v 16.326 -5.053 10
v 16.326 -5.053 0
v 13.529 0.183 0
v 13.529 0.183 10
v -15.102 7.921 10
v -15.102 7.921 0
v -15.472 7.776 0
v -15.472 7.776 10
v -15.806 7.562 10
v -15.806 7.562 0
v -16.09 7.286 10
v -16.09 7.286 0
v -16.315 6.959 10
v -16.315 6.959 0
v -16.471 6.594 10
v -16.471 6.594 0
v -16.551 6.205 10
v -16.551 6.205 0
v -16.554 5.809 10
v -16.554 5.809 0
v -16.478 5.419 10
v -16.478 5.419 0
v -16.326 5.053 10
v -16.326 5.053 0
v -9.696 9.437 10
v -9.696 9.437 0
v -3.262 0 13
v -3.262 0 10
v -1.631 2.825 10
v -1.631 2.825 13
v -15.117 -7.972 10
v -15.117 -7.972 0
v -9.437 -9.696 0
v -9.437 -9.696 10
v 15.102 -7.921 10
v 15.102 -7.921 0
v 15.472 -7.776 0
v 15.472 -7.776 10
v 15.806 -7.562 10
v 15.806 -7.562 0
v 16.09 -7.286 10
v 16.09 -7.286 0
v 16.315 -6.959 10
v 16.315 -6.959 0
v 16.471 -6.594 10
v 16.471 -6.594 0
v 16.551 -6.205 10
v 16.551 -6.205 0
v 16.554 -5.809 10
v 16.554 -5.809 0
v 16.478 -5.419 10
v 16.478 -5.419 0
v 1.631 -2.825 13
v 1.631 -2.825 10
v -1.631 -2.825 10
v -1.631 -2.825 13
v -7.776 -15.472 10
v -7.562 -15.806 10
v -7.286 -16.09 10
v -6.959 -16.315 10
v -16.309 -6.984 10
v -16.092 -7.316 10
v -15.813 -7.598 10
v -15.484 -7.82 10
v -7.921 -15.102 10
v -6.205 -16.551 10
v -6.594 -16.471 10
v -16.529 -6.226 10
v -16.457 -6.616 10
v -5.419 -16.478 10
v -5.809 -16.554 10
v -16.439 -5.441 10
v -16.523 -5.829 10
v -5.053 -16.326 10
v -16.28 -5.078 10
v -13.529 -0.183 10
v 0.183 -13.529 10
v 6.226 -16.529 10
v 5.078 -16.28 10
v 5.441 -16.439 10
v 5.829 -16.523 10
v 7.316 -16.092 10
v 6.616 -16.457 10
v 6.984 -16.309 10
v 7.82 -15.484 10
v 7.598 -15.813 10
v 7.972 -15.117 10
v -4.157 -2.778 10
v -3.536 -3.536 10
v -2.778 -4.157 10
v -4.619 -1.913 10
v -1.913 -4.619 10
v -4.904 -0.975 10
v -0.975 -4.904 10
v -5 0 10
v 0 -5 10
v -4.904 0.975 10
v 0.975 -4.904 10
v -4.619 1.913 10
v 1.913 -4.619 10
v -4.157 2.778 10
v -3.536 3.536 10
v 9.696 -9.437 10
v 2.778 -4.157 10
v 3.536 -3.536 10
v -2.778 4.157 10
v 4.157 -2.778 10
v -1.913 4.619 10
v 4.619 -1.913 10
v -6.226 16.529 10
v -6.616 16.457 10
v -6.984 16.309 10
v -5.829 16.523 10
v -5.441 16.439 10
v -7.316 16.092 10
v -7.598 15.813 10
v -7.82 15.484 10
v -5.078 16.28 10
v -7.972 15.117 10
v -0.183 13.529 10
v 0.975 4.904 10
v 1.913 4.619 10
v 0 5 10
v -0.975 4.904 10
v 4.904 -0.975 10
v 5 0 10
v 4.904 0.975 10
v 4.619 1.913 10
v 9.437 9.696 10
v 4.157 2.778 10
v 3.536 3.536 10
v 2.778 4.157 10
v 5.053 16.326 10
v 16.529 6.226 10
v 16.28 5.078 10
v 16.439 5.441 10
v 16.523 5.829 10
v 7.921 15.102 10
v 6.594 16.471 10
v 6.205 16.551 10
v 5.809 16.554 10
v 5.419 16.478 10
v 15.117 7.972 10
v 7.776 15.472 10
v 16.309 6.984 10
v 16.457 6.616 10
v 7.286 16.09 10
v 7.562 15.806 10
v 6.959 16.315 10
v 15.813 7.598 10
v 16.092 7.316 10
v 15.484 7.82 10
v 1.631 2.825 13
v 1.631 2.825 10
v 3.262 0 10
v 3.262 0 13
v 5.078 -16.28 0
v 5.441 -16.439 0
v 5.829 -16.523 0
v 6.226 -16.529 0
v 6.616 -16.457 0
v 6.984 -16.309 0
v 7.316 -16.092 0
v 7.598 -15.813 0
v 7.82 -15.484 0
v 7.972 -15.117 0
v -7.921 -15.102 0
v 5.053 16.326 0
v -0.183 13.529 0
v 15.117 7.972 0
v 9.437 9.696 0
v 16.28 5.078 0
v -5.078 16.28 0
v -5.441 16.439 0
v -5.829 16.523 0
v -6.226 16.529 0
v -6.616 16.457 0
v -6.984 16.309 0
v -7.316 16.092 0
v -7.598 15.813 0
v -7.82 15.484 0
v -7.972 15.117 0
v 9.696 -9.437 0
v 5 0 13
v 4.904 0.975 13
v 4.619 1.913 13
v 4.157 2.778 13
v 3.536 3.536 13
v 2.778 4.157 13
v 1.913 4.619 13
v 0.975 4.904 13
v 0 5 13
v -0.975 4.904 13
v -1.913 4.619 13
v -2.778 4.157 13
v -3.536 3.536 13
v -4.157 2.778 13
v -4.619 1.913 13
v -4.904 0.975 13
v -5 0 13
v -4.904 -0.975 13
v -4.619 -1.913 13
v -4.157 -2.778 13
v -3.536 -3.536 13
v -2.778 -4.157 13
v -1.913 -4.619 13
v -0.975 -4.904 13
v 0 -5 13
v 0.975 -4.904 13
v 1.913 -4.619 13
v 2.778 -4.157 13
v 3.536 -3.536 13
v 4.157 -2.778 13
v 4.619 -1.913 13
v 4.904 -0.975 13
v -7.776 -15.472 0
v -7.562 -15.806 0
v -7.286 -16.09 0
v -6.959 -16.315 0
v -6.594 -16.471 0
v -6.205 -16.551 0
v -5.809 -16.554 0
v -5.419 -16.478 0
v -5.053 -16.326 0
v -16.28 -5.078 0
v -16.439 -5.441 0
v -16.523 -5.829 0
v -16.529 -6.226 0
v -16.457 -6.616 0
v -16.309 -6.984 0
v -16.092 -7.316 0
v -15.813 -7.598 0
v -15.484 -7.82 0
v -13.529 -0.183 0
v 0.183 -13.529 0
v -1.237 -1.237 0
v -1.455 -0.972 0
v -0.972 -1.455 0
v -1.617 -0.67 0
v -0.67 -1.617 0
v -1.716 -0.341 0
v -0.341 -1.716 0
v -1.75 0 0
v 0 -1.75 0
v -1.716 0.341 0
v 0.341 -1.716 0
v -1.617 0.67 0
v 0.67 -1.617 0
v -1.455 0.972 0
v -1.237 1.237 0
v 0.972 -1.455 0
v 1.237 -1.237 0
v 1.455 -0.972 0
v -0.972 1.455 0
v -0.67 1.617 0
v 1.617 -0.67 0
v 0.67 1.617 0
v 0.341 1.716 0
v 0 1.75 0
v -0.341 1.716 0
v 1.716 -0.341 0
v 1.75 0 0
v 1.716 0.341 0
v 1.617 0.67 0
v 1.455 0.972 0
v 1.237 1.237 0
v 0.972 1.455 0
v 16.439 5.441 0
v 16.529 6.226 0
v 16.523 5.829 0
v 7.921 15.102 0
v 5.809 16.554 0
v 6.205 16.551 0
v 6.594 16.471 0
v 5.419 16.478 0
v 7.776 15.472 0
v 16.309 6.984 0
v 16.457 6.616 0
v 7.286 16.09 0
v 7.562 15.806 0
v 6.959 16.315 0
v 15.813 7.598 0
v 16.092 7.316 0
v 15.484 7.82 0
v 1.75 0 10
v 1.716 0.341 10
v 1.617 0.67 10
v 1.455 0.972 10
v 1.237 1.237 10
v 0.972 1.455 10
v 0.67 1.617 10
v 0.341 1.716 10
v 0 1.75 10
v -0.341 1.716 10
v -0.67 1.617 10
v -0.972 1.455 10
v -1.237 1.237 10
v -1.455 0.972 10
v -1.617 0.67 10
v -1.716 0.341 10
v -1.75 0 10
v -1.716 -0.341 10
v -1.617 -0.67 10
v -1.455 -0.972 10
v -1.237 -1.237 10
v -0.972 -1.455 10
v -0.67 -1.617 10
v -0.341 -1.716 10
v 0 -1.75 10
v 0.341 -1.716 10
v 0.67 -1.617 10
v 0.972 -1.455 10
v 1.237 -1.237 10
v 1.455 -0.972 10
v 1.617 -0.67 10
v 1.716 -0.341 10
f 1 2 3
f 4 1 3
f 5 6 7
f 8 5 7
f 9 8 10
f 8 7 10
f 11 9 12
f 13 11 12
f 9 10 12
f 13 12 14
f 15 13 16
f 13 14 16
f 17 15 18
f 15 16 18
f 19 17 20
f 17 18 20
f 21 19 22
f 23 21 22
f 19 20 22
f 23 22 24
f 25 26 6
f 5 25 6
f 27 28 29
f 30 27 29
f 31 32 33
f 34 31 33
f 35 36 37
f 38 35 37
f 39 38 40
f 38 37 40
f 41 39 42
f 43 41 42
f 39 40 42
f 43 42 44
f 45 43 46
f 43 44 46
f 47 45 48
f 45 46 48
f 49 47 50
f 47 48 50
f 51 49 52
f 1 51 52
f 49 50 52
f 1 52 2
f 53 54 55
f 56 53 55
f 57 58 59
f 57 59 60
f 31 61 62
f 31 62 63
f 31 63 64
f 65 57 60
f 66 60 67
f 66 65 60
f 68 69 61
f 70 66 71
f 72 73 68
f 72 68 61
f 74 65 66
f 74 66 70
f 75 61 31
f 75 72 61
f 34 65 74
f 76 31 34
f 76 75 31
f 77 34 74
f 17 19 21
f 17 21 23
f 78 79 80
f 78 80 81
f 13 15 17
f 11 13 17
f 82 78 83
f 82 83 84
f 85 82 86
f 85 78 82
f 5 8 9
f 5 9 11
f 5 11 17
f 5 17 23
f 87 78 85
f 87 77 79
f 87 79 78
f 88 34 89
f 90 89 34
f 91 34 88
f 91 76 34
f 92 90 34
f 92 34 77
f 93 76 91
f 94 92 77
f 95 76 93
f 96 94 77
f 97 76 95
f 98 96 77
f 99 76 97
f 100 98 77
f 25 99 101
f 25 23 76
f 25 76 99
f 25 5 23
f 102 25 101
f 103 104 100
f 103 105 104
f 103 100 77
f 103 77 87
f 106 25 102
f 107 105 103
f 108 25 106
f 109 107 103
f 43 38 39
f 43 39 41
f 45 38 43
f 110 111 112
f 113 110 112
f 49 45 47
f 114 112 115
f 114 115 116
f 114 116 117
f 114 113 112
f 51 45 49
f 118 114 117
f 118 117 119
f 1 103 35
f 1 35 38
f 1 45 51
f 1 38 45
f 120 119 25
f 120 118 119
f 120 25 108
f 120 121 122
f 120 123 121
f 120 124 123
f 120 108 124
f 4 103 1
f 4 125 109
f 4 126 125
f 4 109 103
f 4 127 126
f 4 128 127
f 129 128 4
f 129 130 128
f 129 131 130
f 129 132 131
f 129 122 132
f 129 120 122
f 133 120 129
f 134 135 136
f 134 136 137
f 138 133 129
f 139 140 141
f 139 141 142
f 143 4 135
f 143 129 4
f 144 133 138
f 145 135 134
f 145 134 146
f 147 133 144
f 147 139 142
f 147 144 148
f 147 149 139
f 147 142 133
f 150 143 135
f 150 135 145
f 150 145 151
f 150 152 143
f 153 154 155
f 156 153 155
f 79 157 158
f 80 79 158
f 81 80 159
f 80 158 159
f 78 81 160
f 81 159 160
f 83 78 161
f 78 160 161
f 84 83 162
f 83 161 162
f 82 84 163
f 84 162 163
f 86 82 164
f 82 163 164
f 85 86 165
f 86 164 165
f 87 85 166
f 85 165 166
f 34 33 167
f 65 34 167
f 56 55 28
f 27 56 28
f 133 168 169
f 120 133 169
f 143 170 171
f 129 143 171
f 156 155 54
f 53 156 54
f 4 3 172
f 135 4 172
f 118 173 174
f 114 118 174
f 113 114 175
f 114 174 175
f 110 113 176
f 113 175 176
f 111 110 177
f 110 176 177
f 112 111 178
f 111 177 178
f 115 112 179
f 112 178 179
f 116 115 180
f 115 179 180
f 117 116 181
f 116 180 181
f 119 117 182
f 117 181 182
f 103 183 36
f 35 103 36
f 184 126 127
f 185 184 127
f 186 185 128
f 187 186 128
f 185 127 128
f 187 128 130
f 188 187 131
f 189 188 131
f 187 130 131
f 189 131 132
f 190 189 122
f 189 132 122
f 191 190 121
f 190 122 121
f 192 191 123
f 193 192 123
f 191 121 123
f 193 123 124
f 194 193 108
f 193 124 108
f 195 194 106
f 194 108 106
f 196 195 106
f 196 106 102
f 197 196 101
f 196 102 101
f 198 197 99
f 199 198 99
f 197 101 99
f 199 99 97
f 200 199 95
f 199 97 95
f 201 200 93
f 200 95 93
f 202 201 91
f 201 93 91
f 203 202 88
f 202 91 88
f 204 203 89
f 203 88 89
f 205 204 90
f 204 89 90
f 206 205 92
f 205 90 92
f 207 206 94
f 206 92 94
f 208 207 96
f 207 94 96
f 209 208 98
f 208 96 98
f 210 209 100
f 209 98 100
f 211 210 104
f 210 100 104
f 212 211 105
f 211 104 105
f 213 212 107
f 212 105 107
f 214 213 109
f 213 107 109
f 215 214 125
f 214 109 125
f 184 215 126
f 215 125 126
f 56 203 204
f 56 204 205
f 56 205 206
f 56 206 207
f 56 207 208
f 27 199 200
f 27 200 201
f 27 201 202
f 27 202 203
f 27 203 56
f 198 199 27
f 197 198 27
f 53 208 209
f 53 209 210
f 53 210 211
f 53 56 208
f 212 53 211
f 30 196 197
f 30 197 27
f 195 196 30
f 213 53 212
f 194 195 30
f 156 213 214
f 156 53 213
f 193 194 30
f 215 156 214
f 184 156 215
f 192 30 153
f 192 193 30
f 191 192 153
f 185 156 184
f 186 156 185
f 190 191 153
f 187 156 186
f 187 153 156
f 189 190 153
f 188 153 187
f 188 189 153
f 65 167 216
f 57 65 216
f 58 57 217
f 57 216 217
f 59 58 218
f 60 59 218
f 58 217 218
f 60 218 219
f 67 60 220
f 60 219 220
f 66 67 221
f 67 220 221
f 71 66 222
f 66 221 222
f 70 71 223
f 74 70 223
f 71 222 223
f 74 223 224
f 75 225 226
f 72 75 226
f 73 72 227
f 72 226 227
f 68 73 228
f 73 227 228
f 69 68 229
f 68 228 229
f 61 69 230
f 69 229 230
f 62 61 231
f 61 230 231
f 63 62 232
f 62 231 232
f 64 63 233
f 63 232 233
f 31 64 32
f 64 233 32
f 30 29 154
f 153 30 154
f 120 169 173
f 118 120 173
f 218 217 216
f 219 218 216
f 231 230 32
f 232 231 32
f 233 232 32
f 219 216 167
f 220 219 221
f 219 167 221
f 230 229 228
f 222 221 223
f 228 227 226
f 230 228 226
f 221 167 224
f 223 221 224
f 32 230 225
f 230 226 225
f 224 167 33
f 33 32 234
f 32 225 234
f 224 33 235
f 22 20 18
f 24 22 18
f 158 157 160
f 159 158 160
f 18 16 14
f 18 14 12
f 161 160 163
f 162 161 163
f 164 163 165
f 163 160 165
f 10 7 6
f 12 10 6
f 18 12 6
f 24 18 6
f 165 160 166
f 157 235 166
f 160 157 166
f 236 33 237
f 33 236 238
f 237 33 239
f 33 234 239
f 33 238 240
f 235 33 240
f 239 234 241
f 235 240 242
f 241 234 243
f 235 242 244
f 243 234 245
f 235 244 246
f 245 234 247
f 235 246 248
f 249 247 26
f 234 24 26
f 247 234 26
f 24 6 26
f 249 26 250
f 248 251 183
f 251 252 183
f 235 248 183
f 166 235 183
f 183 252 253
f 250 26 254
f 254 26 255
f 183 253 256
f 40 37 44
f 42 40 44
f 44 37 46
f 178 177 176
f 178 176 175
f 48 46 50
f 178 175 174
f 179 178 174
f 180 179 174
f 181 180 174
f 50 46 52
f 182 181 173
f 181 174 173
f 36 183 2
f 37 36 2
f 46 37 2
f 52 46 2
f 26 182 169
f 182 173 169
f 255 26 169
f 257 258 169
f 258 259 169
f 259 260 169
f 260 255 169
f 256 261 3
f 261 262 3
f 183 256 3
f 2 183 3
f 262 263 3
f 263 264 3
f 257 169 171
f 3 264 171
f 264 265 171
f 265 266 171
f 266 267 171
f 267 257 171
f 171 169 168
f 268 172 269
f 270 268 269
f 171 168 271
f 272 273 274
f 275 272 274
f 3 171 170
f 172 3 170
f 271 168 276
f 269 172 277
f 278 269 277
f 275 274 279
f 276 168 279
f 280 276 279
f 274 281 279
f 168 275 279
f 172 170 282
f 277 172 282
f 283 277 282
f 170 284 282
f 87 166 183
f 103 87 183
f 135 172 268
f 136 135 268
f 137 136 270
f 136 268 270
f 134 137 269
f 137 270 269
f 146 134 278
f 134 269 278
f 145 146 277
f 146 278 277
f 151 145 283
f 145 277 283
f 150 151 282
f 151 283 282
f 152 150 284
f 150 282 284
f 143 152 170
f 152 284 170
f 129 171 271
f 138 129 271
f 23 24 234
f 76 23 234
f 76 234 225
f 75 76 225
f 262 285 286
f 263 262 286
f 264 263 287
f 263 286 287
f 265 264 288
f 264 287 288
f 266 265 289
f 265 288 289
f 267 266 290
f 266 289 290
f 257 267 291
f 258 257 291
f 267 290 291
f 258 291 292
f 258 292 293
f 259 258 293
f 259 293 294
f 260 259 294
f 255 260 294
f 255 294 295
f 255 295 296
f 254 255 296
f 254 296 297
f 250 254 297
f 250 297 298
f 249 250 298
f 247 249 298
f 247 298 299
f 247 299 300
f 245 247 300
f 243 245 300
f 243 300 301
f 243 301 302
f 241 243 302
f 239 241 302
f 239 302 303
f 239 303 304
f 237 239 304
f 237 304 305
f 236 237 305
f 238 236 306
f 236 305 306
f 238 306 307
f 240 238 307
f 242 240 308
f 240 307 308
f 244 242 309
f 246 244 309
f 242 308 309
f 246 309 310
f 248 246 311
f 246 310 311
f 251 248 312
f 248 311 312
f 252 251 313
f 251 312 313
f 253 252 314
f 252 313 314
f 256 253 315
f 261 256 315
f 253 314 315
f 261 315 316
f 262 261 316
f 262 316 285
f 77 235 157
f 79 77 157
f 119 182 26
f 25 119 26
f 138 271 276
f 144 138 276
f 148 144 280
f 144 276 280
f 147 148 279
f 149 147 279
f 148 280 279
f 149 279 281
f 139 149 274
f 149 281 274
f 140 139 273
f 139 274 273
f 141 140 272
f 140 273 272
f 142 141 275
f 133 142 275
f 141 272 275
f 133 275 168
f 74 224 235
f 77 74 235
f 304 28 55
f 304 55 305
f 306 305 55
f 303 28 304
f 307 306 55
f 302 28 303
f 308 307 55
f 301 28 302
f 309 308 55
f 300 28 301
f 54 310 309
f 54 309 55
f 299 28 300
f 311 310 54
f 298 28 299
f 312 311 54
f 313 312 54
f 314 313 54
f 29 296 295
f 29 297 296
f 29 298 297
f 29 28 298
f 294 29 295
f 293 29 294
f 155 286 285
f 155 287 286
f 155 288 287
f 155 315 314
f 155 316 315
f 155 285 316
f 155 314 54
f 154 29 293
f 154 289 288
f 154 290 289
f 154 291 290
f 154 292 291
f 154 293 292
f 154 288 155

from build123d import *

# Parameters (mm, degrees)
F1_DEPTH = 10
F2_R     = 5
F3_DEPTH = 3
F4_R     = 1.75
F5_DEPTH = 10.001


with BuildPart() as f1:
    # F0 (on Top) → F1 (new body)
    with BuildSketch(Plane.XY):
        with BuildLine():
            Line((-7.971794, 15.117246), (-9.695514, 9.43691))
            Line((-9.695514, 9.43691), (-15.102408, 7.920959))
            ThreePointArc((-15.102408, 7.920959), (-16.401997, 6.78019), (-16.326416, 5.052598))
            Line((-16.326416, 5.052598), (-13.528667, -0.182861))
            Line((-13.528667, -0.182861), (-16.279979, -5.078052))
            ThreePointArc((-16.279979, -5.078052), (-16.392282, -6.803645), (-15.117246, -7.971794))
            Line((-15.117246, -7.971794), (-9.43691, -9.695514))
            Line((-9.43691, -9.695514), (-7.920959, -15.102408))
            ThreePointArc((-7.920959, -15.102408), (-6.78019, -16.401997), (-5.052598, -16.326416))
            Line((-5.052598, -16.326416), (0.182861, -13.528667))
            Line((0.182861, -13.528667), (5.078052, -16.279979))
            ThreePointArc((5.078052, -16.279979), (6.803645, -16.392282), (7.971794, -15.117246))
            Line((7.971794, -15.117246), (9.695514, -9.43691))
            Line((9.695514, -9.43691), (15.102408, -7.920959))
            ThreePointArc((15.102408, -7.920959), (16.401997, -6.78019), (16.326416, -5.052598))
            Line((16.326416, -5.052598), (13.528667, 0.182861))
            Line((13.528667, 0.182861), (16.279979, 5.078052))
            ThreePointArc((16.279979, 5.078052), (16.392282, 6.803645), (15.117246, 7.971794))
            Line((15.117246, 7.971794), (9.43691, 9.695514))
            Line((9.43691, 9.695514), (7.920959, 15.102408))
            ThreePointArc((7.920959, 15.102408), (6.78019, 16.401997), (5.052598, 16.326416))
            Line((5.052598, 16.326416), (-0.182861, 13.528667))
            Line((-0.182861, 13.528667), (-5.078052, 16.279979))
            ThreePointArc((-5.078052, 16.279979), (-6.803645, 16.392282), (-7.971794, 15.117246))
        make_face()
    extrude(amount=F1_DEPTH)

    # F2 (on face) → F3 (join)
    with BuildSketch(Plane.XY.offset(10)):
        Circle(F2_R)
        Polygon((-3.262029, 0), (-1.631015, 2.825), (1.631015, 2.825), (3.262029, 0), (1.631015, -2.825), (-1.631015, -2.825), align=None, mode=Mode.SUBTRACT)
    extrude(amount=F3_DEPTH)

    # F4 (on face) → F5 (cut, through all)
    with BuildSketch(Plane.XY.offset(10)):
        Circle(F4_R)
    extrude(amount=-F5_DEPTH, mode=Mode.SUBTRACT)


solid = f1.part
